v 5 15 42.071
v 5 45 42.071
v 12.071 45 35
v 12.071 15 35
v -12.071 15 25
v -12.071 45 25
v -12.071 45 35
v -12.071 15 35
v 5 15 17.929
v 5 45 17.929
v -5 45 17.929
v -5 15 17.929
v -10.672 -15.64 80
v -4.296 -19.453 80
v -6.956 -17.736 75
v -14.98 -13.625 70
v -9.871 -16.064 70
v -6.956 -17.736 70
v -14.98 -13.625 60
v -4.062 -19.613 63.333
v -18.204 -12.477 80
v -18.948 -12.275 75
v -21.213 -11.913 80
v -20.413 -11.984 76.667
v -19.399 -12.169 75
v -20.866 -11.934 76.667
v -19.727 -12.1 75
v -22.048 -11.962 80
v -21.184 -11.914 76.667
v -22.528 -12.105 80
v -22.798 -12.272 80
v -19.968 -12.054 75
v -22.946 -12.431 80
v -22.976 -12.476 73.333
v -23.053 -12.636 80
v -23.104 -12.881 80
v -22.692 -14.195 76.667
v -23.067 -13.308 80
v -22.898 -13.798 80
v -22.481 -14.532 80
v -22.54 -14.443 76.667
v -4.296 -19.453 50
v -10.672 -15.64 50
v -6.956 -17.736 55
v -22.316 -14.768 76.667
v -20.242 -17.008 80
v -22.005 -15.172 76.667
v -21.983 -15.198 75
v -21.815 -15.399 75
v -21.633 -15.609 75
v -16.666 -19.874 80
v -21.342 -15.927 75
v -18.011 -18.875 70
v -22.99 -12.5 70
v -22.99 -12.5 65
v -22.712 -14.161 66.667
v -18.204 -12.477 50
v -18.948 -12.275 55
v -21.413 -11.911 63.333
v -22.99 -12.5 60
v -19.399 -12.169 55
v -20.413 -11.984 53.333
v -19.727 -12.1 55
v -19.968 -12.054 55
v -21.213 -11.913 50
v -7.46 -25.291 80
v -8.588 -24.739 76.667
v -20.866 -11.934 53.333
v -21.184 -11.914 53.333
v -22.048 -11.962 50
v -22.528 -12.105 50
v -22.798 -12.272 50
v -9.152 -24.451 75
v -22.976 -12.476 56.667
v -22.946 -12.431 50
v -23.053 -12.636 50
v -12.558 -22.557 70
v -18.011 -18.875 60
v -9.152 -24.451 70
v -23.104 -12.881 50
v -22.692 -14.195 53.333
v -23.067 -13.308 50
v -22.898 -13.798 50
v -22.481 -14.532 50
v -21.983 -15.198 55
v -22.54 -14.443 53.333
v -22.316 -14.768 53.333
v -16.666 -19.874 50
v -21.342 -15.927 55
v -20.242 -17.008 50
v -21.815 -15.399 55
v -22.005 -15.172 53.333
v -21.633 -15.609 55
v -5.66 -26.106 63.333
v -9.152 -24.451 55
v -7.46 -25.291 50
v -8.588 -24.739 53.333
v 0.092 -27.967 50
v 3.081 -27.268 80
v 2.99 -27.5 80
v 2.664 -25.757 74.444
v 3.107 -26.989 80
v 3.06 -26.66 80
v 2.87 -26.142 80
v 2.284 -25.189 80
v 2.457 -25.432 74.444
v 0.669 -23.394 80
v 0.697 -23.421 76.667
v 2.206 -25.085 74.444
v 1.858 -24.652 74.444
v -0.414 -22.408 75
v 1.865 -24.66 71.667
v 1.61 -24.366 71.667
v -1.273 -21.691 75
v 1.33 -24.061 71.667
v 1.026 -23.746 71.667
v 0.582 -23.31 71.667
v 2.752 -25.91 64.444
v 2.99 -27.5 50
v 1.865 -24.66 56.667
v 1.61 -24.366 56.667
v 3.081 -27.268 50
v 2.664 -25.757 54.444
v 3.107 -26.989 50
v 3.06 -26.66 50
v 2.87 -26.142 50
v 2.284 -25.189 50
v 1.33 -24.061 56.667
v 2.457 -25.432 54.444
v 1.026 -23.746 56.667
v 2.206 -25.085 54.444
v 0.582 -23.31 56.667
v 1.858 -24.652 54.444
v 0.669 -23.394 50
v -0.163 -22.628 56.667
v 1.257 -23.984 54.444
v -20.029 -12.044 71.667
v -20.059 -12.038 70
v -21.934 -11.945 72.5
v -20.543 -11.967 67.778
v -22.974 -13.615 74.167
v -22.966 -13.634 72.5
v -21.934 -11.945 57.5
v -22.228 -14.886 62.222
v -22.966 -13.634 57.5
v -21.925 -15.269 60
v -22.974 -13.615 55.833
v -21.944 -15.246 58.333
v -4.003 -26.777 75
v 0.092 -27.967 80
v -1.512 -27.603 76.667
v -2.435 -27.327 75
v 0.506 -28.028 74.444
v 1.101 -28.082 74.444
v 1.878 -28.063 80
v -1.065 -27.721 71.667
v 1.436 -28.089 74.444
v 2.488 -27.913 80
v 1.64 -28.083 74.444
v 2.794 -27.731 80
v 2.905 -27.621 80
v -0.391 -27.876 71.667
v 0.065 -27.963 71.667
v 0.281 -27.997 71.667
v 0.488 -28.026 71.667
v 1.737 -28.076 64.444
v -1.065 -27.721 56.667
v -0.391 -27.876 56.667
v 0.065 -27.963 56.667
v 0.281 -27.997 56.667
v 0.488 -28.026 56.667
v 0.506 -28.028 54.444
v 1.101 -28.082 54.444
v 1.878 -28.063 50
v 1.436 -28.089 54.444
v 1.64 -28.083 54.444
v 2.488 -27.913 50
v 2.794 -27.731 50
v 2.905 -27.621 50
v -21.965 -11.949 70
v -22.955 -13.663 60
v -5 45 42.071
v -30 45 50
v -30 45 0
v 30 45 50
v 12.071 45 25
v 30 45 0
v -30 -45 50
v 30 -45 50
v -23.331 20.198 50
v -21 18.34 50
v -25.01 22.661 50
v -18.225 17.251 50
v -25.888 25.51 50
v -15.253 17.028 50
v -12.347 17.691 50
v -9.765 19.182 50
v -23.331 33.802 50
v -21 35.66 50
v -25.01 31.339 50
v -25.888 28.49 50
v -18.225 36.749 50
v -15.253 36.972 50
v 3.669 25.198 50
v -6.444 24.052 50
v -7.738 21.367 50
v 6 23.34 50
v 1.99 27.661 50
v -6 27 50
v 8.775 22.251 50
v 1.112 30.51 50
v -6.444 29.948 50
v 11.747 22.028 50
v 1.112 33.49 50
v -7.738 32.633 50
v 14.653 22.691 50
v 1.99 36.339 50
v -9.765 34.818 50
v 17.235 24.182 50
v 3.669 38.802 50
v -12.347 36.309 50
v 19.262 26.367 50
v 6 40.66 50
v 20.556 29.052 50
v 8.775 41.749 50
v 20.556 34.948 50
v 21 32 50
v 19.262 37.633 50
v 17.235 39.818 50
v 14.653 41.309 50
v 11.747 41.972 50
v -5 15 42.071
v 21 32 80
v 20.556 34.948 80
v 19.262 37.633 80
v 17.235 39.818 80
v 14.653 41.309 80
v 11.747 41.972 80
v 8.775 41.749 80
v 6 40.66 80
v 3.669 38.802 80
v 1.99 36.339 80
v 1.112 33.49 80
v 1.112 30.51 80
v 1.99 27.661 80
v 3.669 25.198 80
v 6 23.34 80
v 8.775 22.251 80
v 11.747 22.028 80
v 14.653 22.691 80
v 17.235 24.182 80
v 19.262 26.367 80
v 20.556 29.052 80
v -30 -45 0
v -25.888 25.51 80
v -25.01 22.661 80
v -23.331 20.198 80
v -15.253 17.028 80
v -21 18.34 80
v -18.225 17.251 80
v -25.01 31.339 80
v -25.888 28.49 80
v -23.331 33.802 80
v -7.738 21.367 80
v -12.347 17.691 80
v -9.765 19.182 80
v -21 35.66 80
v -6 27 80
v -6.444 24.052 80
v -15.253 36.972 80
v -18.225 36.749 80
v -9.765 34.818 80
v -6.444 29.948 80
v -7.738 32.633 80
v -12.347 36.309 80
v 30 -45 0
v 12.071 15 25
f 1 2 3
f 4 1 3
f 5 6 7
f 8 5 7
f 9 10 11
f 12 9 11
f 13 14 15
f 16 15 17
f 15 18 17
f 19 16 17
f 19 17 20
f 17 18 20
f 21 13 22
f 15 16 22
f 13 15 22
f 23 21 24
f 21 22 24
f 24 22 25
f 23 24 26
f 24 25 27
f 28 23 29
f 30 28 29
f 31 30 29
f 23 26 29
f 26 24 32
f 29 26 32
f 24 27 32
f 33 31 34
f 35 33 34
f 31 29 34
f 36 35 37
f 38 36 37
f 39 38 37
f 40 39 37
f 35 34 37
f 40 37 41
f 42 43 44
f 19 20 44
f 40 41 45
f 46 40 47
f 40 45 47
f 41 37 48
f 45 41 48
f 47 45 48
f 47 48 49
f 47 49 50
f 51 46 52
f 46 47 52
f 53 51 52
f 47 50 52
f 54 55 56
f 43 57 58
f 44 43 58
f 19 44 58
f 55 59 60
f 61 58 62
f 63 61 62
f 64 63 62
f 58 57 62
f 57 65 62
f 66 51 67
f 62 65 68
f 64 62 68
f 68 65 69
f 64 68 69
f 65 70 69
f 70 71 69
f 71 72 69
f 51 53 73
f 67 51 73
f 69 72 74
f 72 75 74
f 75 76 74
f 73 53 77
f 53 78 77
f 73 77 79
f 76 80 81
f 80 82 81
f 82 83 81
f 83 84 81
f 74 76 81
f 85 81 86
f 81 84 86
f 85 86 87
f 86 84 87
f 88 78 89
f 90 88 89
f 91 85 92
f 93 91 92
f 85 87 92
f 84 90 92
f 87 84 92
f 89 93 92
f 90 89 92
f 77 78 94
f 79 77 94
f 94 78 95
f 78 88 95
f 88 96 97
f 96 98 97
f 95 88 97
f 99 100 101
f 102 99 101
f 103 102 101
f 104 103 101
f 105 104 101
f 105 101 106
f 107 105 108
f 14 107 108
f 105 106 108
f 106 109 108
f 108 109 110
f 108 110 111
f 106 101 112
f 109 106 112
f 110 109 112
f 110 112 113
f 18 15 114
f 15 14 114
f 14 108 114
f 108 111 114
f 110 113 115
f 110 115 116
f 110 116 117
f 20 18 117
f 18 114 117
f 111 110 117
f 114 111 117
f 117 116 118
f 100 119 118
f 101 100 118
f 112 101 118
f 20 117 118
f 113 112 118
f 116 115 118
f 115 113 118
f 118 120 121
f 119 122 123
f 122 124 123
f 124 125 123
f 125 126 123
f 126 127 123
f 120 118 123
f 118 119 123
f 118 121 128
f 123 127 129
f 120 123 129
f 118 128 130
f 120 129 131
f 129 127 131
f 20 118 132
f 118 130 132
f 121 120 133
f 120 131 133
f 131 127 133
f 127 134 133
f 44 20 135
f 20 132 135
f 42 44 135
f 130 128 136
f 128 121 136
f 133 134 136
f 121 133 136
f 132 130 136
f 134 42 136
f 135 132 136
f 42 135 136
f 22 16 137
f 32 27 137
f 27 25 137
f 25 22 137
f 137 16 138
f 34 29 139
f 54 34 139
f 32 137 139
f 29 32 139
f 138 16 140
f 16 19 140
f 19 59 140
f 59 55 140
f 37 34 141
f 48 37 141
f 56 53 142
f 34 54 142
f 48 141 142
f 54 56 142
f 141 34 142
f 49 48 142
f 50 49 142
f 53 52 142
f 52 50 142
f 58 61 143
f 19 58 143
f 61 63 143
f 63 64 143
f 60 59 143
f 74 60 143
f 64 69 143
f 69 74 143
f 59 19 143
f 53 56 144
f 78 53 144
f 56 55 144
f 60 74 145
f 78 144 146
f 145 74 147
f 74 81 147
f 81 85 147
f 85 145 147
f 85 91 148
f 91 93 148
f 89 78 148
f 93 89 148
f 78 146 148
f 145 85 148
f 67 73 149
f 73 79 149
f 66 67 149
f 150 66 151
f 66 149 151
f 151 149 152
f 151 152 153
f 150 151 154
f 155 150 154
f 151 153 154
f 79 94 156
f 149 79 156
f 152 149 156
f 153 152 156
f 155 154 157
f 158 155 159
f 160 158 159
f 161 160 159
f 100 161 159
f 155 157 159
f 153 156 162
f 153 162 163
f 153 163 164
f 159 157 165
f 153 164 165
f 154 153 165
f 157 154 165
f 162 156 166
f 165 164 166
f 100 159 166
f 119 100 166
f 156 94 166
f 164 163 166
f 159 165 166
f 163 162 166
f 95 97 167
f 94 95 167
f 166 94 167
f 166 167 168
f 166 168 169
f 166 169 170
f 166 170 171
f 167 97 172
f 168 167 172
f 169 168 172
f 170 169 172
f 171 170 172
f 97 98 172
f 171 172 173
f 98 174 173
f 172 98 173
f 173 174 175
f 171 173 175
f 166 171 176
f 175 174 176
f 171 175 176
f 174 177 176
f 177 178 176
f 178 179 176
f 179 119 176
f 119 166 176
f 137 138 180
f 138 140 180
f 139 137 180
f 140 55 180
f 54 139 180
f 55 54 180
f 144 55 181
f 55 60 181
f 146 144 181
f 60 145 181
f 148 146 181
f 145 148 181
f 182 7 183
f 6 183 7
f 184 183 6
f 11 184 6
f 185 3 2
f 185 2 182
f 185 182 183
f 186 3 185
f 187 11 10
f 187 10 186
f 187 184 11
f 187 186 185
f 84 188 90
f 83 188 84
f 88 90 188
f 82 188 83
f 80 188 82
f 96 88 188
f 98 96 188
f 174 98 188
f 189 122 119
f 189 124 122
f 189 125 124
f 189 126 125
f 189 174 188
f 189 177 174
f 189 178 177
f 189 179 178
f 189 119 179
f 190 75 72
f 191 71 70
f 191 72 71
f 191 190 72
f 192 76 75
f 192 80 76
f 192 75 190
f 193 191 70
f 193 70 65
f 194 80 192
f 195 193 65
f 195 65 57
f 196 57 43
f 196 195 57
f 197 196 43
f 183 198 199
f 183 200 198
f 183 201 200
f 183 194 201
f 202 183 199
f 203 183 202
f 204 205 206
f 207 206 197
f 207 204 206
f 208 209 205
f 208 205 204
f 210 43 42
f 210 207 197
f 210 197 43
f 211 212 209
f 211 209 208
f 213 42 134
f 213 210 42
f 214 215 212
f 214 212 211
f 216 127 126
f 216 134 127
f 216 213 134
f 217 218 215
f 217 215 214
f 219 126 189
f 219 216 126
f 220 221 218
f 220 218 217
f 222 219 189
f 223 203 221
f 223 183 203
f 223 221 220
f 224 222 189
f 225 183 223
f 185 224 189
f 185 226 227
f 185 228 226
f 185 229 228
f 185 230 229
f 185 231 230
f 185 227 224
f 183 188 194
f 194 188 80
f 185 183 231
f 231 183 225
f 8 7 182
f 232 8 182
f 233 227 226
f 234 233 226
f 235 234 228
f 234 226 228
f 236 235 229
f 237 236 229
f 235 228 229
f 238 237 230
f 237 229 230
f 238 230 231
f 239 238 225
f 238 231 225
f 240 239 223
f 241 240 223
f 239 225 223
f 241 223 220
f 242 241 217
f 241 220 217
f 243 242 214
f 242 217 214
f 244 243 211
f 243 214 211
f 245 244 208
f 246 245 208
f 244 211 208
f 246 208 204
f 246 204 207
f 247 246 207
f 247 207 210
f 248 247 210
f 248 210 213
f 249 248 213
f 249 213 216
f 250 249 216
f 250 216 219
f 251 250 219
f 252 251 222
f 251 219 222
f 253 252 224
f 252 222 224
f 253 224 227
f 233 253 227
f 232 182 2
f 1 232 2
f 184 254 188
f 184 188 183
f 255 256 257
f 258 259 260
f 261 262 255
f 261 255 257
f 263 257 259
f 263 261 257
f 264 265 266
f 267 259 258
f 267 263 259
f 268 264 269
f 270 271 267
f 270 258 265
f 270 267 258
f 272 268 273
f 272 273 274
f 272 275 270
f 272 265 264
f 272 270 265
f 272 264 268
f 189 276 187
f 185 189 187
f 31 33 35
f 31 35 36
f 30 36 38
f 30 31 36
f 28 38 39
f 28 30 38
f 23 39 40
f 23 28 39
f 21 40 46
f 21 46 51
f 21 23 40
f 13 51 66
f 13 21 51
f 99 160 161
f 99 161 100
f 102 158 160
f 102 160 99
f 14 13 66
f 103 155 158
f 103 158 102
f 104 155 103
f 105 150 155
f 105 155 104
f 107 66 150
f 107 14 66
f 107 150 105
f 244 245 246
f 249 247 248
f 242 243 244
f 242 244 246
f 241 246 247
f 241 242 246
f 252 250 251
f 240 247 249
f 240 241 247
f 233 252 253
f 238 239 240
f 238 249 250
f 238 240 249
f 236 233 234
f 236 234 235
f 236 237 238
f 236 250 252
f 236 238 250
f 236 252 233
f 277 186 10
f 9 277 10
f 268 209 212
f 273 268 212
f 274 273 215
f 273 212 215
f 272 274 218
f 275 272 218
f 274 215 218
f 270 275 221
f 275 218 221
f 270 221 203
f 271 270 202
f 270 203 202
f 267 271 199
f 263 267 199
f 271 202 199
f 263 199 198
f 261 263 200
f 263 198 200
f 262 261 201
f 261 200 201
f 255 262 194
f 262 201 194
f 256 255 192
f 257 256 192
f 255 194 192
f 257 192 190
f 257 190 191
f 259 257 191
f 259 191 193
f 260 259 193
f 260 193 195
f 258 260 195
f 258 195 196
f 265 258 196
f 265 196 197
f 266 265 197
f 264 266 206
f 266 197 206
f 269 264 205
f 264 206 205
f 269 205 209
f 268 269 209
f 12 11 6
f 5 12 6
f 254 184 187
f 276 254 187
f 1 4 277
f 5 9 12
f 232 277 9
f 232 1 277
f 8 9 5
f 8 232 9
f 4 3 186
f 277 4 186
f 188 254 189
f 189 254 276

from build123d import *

# Parameters (mm, degrees)
F0_W     = 60
F0_H     = 90
F1_DEPTH = 50
F2_R     = 10
F3_DEPTH = 30
F5_DEPTH = 30


with BuildPart() as f1:
    # F0 (on Top) → F1 (new body)
    with BuildSketch(Plane.XY):
        Rectangle(F0_W, F0_H)
    extrude(amount=F1_DEPTH)

    # F2 (on face) → F3 (join)
    with BuildSketch(Plane.XY.offset(50)):
        with Locations((11, 32)):
            Circle(F2_R)
        with Locations((-16, 27)):
            Circle(F2_R)
        with BuildLine():
            add(Edge.make_bspline(
                [(2.990381, -27.5), (6.02147, -22.25), (-14.979646, -13.625), (-35.980762, -5), (-18.010735, -18.875), (-0.040708, -32.75), (2.990381, -27.5)],
                knots=[0, 0, 0, 2.094395, 2.094395, 4.18879, 4.18879, 6.283185, 6.283185, 6.283185], degree=2, weights=[1, 0.5, 1, 0.5, 1, 0.5, 1]))
        make_face()
    extrude(amount=F3_DEPTH)

    # F4 (on face) → F5 (cut)
    with BuildSketch(Plane(origin=(0, 45, 0), x_dir=(-1, 0, 0), z_dir=(0, 1, 0))):
        Polygon((5, 17.928932), (12.071068, 25), (12.071068, 35), (5, 42.071068), (-5, 42.071068), (-12.071068, 35), (-12.071068, 25), (-5, 17.928932), align=None)
    extrude(amount=-F5_DEPTH, mode=Mode.SUBTRACT)


solid = f1.part
